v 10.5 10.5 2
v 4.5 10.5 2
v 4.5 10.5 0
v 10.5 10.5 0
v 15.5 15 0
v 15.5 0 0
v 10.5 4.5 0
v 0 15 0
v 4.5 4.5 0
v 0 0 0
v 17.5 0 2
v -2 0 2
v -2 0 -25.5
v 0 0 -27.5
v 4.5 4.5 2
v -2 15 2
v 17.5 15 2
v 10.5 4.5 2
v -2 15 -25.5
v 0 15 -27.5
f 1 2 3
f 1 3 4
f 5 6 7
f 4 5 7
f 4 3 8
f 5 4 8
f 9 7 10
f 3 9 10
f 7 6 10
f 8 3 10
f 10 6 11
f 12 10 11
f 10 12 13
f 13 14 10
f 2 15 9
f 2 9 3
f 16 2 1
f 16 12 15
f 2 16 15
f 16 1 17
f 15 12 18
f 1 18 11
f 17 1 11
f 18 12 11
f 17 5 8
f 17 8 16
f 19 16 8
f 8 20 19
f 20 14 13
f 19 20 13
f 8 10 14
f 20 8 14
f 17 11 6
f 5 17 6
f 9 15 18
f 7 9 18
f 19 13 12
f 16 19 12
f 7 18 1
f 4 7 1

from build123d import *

# Parameters (mm, degrees)
EXTRUDE_1_DEPTH     = 15
SKETCH_2_W          = 6
SKETCH_2_H          = 6
CUT_EXTRUDE_1_DEPTH = 38.436613095


with BuildPart() as part:
    # Эскиз1 → Бобышка-Вытянуть1 (new body)
    with BuildSketch(Plane(origin=(0, 0, 0), x_dir=(1, 0, 0), z_dir=(0, 1, 0))):
        Polygon((-2, 25.5), (-2, -2), (17.5, -2), (15.5, 0), (0, 0), (0, 27.5), align=None)
    extrude(amount=EXTRUDE_1_DEPTH)

    # Эскиз2 → Вырез-Вытянуть1 (cut, through all)
    with BuildSketch(Plane.XY.offset(2)):
        with Locations((7.5, 7.5)):
            Rectangle(SKETCH_2_W, SKETCH_2_H)
    extrude(amount=-CUT_EXTRUDE_1_DEPTH, mode=Mode.SUBTRACT)


solid = part.part
